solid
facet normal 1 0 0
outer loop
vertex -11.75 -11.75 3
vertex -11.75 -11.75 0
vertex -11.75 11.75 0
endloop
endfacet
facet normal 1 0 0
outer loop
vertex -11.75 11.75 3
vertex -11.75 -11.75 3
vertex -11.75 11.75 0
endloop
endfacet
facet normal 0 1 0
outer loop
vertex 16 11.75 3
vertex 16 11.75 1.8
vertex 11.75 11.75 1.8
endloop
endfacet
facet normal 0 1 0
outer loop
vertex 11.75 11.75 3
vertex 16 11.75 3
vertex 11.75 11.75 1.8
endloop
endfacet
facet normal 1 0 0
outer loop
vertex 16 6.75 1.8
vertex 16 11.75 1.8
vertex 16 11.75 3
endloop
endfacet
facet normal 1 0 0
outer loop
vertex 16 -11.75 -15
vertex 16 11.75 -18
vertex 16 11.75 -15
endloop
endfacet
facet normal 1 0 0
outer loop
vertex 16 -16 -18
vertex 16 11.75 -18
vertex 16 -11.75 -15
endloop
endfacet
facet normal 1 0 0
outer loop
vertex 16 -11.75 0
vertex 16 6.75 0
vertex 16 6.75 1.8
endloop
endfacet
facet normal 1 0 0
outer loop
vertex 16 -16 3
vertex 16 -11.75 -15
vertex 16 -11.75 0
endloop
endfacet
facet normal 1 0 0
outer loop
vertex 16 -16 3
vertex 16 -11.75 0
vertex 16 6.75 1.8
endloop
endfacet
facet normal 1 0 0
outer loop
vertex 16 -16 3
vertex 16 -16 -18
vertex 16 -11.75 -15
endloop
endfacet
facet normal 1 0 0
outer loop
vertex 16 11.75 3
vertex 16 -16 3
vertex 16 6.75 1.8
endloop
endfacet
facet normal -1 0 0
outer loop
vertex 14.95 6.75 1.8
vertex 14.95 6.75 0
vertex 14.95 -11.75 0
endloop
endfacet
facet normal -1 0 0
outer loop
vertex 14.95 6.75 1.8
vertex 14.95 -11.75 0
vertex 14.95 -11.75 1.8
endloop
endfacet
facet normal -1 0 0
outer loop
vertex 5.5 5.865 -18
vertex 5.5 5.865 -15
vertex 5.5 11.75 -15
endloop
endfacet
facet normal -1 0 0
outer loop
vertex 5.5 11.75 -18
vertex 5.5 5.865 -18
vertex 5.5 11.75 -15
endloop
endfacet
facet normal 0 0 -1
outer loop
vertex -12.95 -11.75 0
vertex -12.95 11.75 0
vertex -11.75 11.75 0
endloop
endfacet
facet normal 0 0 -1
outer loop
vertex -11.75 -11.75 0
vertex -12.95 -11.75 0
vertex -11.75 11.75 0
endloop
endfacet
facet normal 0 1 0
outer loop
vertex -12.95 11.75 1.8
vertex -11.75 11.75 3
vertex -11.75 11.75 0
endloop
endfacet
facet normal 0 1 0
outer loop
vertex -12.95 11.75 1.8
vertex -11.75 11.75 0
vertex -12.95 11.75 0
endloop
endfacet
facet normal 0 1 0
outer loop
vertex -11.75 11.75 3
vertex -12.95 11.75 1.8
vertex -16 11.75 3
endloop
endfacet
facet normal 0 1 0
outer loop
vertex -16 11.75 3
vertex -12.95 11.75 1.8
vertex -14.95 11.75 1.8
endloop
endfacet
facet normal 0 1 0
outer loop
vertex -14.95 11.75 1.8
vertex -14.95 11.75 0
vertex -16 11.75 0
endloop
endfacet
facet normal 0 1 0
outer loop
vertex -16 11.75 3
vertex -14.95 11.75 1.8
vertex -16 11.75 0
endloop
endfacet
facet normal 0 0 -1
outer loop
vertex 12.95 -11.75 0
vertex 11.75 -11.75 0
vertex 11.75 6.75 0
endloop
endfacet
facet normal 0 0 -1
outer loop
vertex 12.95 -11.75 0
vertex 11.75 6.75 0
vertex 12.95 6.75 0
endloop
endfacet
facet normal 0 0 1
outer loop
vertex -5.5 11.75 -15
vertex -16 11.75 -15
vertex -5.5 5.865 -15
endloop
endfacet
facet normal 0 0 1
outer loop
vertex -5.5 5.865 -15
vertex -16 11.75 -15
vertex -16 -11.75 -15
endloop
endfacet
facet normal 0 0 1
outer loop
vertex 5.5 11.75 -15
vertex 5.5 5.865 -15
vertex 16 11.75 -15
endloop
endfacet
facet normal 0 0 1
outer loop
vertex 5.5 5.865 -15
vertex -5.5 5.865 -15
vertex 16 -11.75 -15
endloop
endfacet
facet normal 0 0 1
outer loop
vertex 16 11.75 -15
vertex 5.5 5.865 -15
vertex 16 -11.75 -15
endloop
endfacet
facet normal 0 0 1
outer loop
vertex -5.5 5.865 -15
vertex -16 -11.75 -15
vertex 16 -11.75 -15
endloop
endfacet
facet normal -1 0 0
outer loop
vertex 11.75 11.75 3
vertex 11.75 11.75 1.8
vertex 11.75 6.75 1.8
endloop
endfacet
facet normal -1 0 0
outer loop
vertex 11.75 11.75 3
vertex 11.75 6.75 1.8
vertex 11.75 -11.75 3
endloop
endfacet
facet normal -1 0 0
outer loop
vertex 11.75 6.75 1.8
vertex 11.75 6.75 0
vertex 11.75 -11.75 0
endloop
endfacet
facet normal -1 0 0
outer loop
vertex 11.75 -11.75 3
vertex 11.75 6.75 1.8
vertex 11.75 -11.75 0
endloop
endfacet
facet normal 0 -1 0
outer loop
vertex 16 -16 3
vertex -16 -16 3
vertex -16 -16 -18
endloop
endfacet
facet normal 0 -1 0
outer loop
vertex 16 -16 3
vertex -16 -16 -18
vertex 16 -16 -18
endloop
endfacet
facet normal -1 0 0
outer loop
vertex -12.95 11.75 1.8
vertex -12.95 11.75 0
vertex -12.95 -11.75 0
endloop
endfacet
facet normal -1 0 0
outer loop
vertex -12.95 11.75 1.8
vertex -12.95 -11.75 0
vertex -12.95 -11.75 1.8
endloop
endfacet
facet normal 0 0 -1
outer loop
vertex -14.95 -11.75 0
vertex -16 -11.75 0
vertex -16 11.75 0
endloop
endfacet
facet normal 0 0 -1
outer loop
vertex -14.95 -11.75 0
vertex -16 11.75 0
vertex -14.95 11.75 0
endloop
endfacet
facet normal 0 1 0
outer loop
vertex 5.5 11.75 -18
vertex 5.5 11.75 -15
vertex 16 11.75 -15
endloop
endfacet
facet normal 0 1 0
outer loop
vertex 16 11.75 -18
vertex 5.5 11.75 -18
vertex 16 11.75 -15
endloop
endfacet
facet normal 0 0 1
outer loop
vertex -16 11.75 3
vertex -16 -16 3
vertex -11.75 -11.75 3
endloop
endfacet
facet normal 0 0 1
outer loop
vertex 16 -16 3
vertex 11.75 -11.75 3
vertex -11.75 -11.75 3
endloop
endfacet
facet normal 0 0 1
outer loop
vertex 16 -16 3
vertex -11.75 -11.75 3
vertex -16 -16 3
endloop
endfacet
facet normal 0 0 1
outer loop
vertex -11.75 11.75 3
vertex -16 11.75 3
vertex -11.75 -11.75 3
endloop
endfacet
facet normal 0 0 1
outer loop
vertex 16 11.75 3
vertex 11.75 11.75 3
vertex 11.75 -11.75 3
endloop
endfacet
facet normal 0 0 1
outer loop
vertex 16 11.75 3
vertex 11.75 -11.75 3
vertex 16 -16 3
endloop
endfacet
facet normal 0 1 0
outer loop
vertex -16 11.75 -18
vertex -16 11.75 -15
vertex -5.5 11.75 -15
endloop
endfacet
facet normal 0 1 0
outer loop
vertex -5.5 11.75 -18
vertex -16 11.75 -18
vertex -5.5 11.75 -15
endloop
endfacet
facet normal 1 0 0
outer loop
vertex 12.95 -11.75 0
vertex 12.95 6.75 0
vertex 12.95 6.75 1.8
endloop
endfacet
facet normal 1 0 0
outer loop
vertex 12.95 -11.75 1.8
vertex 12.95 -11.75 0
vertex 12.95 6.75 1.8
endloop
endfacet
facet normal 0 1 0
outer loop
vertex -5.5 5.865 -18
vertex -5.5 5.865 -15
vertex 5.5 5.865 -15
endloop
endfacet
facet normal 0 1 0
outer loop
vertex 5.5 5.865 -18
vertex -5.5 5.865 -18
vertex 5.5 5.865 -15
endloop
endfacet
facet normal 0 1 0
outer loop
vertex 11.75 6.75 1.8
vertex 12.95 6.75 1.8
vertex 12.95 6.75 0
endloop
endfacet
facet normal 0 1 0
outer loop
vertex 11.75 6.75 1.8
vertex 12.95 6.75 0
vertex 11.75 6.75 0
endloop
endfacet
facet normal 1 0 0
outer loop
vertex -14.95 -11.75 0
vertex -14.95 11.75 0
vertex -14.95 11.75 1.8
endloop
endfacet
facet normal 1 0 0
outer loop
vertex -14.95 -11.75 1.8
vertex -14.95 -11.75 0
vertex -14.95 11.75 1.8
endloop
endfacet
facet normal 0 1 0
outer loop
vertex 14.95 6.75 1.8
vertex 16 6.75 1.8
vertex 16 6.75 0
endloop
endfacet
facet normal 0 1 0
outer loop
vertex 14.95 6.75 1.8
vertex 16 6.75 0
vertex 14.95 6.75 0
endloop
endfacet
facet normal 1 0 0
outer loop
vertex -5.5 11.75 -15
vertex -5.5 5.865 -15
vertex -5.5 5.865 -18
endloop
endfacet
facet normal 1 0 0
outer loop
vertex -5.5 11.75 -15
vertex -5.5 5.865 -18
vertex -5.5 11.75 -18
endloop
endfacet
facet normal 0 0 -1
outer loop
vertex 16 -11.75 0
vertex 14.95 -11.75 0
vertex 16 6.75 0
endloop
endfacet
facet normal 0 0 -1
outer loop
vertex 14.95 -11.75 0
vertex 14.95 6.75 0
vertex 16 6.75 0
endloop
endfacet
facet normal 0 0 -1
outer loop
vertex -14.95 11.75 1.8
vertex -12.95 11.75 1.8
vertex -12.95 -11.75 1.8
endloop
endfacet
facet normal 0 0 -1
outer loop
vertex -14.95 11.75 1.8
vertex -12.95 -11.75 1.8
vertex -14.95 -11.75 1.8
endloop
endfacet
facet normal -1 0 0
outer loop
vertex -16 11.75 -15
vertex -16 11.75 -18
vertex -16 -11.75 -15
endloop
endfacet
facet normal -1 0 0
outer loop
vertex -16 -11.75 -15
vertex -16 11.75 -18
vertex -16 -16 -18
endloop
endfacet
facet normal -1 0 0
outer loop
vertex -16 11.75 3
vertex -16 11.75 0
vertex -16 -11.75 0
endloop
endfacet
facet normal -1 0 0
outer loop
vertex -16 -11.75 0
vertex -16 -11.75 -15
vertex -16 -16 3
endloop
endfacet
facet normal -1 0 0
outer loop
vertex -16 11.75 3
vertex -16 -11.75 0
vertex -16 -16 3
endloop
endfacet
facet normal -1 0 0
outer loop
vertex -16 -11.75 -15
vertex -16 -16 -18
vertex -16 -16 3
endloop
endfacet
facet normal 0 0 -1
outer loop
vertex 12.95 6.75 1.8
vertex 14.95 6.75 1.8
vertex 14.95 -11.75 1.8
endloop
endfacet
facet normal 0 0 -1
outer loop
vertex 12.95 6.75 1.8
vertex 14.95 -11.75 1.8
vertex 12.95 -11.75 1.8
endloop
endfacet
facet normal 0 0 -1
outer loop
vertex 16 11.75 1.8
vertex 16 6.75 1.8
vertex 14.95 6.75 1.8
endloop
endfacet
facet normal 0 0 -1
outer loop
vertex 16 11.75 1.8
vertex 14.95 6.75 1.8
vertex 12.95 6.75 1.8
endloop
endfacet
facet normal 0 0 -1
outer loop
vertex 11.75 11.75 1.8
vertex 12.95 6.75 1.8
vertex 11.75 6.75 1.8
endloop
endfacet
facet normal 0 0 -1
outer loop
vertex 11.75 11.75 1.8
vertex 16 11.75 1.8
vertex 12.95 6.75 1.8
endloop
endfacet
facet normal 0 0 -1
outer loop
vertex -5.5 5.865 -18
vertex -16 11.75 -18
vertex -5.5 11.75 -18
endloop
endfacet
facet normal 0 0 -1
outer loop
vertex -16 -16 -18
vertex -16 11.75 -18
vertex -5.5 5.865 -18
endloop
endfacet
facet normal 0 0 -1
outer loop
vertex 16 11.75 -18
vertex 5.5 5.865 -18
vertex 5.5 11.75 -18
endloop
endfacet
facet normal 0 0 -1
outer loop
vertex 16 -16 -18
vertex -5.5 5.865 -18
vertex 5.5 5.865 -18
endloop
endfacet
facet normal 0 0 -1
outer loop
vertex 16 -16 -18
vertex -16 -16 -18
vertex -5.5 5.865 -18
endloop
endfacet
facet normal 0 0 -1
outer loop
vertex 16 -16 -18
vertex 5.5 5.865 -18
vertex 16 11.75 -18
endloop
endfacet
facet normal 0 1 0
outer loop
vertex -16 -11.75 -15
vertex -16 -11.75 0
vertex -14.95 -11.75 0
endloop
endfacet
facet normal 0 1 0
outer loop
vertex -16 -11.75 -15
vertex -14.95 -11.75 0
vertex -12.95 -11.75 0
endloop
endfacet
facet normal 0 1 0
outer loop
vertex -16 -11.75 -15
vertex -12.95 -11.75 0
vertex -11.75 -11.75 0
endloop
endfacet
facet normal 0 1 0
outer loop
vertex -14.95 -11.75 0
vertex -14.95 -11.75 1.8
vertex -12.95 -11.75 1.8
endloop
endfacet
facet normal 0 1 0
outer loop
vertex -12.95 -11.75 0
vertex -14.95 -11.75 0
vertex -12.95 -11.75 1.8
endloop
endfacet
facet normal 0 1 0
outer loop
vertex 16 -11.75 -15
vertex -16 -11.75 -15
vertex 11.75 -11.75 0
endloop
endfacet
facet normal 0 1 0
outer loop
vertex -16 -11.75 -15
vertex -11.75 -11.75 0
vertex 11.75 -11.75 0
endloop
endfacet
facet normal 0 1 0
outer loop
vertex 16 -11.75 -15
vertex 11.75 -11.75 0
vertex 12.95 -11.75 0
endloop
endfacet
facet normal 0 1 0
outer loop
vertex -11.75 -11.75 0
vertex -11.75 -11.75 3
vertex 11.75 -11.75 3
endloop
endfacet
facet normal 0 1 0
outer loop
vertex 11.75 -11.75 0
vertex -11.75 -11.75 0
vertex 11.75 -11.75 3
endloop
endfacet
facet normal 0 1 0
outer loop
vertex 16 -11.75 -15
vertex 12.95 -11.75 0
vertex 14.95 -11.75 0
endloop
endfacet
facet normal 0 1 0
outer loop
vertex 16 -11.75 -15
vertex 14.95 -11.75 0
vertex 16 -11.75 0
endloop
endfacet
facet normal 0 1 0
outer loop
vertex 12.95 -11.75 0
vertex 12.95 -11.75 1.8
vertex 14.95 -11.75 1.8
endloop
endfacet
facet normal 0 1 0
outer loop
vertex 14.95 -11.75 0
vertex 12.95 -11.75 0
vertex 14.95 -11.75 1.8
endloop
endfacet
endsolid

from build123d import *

# Parameters (mm, degrees)
F1_DEPTH  = 3
F2_W      = 32
F2_H      = 4.25
F3_DEPTH  = 15
F4_W      = 32
F4_H      = 3
F5_DEPTH  = 27.75
F6_W      = 2
F6_H      = 1.8
F7_DEPTH  = 23.5
F8_W      = 4.25
F8_H      = 1.8
F9_DEPTH  = 5
F10_W     = 11
F10_H     = 5.8846425861
F11_DEPTH = 3


with BuildPart() as f1:
    # F0 (on Top) → F1 (new body)
    with BuildSketch(Plane.XY):
        Polygon((11.75, 11.75), (11.75, -11.75), (-11.75, -11.75), (-11.75, 11.75), (-16, 11.75), (-16, -16), (16, -16), (16, 11.75), align=None)
    extrude(amount=F1_DEPTH)

    # F2 (on face) → F3 (join)
    with BuildSketch(Plane(origin=(0, 0, 0), x_dir=(1, 0, 0), z_dir=(0, 0, -1))):
        with Locations((0, 13.875)):
            Rectangle(F2_W, F2_H)
    extrude(amount=F3_DEPTH)

    # F4 (on face) → F5 (join, through all)
    with BuildSketch(Plane.XZ.offset(16)):
        with Locations((0, -16.5)):
            Rectangle(F4_W, F4_H)
    extrude(amount=-F5_DEPTH)

    # F6 (on face) → F7 (cut, through all)
    with BuildSketch(Plane(origin=(0, 11.75, 0), x_dir=(-1, 0, 0), z_dir=(0, 1, 0))):
        with Locations((13.95, 0.9)):
            Rectangle(F6_W, F6_H)
        with Locations((-13.95, 0.9)):
            Rectangle(F6_W, F6_H)
    extrude(amount=-F7_DEPTH, mode=Mode.SUBTRACT)

    # F8 (on face) → F9 (cut)
    with BuildSketch(Plane(origin=(0, 11.75, 0), x_dir=(-1, 0, 0), z_dir=(0, 1, 0))):
        with Locations((-13.875, 0.9)):
            Rectangle(F8_W, F8_H)
    extrude(amount=-F9_DEPTH, mode=Mode.SUBTRACT)

    # F10 (on face) → F11 (cut, through all)
    with BuildSketch(Plane.XY.offset(-15)):
        with Locations((0, 8.8076787069)):
            Rectangle(F10_W, F10_H)
    extrude(amount=-F11_DEPTH, mode=Mode.SUBTRACT)


solid = f1.part
